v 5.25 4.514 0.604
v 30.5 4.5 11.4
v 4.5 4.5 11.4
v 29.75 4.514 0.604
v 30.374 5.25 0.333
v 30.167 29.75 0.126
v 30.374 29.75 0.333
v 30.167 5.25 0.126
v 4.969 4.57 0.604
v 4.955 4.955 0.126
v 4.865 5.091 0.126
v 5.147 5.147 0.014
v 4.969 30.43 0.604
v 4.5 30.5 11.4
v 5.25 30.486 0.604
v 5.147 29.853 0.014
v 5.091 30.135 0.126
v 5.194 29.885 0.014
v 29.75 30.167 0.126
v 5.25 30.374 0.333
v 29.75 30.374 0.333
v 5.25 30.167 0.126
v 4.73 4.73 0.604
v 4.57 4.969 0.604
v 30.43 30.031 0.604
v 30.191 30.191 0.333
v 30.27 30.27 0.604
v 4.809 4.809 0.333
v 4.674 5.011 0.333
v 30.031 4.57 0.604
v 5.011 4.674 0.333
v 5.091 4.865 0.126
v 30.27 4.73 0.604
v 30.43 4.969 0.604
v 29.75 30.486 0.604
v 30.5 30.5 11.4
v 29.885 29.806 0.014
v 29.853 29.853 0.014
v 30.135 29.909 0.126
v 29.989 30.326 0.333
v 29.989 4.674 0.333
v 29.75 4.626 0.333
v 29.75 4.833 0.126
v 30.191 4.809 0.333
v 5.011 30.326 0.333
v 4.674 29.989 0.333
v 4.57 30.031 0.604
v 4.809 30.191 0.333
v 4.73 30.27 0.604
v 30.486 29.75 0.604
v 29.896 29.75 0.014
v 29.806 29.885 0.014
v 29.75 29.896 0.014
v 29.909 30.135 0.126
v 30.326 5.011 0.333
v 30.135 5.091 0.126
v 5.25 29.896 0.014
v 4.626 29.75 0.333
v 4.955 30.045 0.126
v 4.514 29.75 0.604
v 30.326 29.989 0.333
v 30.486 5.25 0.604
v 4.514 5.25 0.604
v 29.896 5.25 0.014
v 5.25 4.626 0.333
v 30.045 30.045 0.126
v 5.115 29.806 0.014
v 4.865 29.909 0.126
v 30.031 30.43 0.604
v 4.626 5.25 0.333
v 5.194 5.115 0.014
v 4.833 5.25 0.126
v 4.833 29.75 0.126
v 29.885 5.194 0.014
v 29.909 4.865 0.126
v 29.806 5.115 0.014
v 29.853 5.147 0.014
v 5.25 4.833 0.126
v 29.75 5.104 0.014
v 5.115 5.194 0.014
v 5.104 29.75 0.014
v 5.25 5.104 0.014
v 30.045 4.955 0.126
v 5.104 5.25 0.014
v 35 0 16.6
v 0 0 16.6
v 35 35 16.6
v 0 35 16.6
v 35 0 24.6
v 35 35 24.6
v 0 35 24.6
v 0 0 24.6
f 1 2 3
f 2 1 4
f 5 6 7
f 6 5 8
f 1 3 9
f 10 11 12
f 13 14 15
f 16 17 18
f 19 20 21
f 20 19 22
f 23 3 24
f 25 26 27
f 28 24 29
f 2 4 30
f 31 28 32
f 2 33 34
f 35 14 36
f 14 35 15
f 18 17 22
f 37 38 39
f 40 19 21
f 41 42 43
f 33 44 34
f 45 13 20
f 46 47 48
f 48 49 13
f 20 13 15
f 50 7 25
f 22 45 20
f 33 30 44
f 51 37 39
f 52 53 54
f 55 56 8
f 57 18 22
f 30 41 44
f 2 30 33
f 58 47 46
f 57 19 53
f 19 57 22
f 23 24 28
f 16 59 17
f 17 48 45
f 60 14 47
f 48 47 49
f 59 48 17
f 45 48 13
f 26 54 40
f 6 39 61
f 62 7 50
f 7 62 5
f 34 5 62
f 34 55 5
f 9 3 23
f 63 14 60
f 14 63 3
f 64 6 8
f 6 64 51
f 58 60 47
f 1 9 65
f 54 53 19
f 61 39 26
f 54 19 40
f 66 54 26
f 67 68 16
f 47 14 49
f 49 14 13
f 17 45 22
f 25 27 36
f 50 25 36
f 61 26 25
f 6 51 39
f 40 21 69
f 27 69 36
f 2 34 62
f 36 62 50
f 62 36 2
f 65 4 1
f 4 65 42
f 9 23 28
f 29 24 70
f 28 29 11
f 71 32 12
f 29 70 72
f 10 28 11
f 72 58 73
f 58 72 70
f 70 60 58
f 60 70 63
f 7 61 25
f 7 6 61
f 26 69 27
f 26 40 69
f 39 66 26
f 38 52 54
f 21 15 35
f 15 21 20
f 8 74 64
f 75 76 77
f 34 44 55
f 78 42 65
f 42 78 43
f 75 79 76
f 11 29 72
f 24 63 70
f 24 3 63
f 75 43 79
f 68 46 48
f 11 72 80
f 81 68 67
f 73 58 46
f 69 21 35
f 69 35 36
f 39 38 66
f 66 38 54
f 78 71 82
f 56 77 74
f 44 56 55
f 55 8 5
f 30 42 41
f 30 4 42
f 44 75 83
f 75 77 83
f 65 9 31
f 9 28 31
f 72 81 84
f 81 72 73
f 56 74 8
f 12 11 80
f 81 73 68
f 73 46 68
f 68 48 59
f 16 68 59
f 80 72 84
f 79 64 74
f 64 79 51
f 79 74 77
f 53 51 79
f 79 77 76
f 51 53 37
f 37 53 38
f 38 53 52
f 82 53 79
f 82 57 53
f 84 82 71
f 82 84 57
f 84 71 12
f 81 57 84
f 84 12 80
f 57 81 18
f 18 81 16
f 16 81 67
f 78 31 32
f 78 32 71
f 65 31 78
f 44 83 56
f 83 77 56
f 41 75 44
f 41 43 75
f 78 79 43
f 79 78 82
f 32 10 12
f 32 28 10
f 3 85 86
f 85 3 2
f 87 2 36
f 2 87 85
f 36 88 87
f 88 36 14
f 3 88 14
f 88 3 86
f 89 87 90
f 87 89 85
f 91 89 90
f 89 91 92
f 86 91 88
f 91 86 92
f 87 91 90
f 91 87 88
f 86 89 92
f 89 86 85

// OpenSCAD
// DungeonBlocks - Blank Floor Tile

/* [Tile] */
cols = 1;  // number of tile columns
rows = 1;  // number of tile rows

/* [Wall] */
wall_n         = false;
wall_e         = false;
wall_w         = false;
wall_s         = false;
wall_height    = 33.0;  // height from slab base — top is fixed regardless of floor height
wall_thickness =  7.0;  // wall depth in mm

/* [Floor] */
floor_preset   = 9.5; // [0:Custom, 3:Water (3mm), 6:Ground (6mm), 9.5:Manmade (9.5mm)]
floor_custom   = 9.5; // custom height in mm — only used when preset is Custom
floor_texture  = true;
texture_depth  = 1.5; // how deep the texture is embossed in mm
texture_zoom   = 1.0; // 1 = full image, 2 = use 1/4 of image at 2x scale

/* [Socket] */
peg_height = 11.4; // [11.4:Normal, 5.7:Short]


/* [Hidden] */

tile_size        = 35.0;
peg_size         = 26.0;
corner_bevel     =  0.75;
round_corners    = true;
peg_flare_height = 5.2;
corner_fn        = 16;

floor_height = (floor_preset == 0) ? floor_custom : floor_preset;

peg_top_z = peg_height;
base_z    = peg_height + peg_flare_height;

total_w = cols * tile_size;
total_d = rows * tile_size;


// --- Helpers ---

module _corner_discs(size_xy, z, r) {
    inset = (tile_size - size_xy) / 2;
    rr    = min(r, size_xy / 2 - 0.01);
    for (x = [inset + rr, inset + size_xy - rr])
    for (y = [inset + rr, inset + size_xy - rr])
        translate([x, y, z])
            cylinder(r=rr, h=0.001, $fn=corner_fn);
}

module centered_square_prism(size_xy, z0, height, r=0, round_bottom=false) {
    inset = (tile_size - size_xy) / 2;
    if (r <= 0) {
        translate([inset, inset, z0])
            cube([size_xy, size_xy, height], center=false);
    } else {
        rr = min(r, size_xy / 2 - 0.01);
        if (round_bottom) {
            hull() {
                for (x = [inset + rr, inset + size_xy - rr])
                for (y = [inset + rr, inset + size_xy - rr])
                    translate([x, y, z0 + rr])
                        sphere(r=rr, $fn=corner_fn);
                translate([inset, inset, z0 + height])
                    cube([size_xy, size_xy, 0.001]);
            }
        } else {
            hull() {
                for (x = [inset + rr, inset + size_xy - rr])
                for (y = [inset + rr, inset + size_xy - rr])
                    translate([x, y, z0])
                        cylinder(r=rr, h=0.001, $fn=corner_fn);
                translate([inset, inset, z0 + height])
                    cube([size_xy, size_xy, 0.001]);
            }
        }
    }
}

module square_frustum(bottom_size, top_size, z0, height, r=0) {
    if (r <= 0) {
        bi = (tile_size - bottom_size) / 2;
        ti = (tile_size - top_size) / 2;
        polyhedron(
            points = [
                [bi,             bi,             z0],
                [tile_size - bi, bi,             z0],
                [tile_size - bi, tile_size - bi, z0],
                [bi,             tile_size - bi, z0],
                [ti,             ti,             z0 + height],
                [tile_size - ti, ti,             z0 + height],
                [tile_size - ti, tile_size - ti, z0 + height],
                [ti,             tile_size - ti, z0 + height]
            ],
            faces = [
                [0, 3, 2, 1],
                [4, 5, 6, 7],
                [0, 1, 5, 4],
                [1, 2, 6, 5],
                [2, 3, 7, 6],
                [3, 0, 4, 7]
            ]
        );
    } else {
        hull() {
            _corner_discs(bottom_size, z0,          r);
            _corner_discs(top_size,    z0 + height, r);
        }
    }
}


// --- Components ---

module socket_base() {
    r           = round_corners ? corner_bevel : 0;
    bevel_entry = !round_corners && corner_bevel > 0;
    col_z0      = bevel_entry ? corner_bevel : 0;
    col_height  = peg_top_z - col_z0;

    if (bevel_entry)
        square_frustum(peg_size - 2 * corner_bevel, peg_size, 0, corner_bevel);

    centered_square_prism(peg_size, col_z0, col_height, r, round_corners);

    square_frustum(peg_size, tile_size, peg_top_z, peg_flare_height);
}

texture_file = "../textures/grass-scene-faded.png";

module floor_tile() {
    translate([0, 0, base_z]) {
        if (floor_texture) {
            cube([total_w, total_d, floor_height - texture_depth]);
            translate([0, 0, floor_height - texture_depth])
                if (texture_zoom == 1) {
                    resize([total_w, total_d, texture_depth])
                        surface(file=texture_file, invert=false);
                } else {
                    intersection() {
                        cube([total_w, total_d, texture_depth]);
                        resize([total_w * texture_zoom, total_d * texture_zoom, texture_depth])
                            surface(file=texture_file, invert=false);
                    }
                }
        } else {
            cube([total_w, total_d, floor_height]);
        }
    }
}

// --- Model ---

union() {
    for (c = [0:cols-1], r = [0:rows-1])
        translate([c * tile_size, r * tile_size, 0])
            socket_base();
    floor_tile();
    if (wall_w) translate([0,                        0, base_z]) cube([wall_thickness, total_d, wall_height]);
    if (wall_e) translate([total_w - wall_thickness, 0, base_z]) cube([wall_thickness, total_d, wall_height]);
    if (wall_s) translate([0,                        0, base_z]) cube([total_w, wall_thickness, wall_height]);
    if (wall_n) translate([0, total_d - wall_thickness, base_z]) cube([total_w, wall_thickness, wall_height]);
}
